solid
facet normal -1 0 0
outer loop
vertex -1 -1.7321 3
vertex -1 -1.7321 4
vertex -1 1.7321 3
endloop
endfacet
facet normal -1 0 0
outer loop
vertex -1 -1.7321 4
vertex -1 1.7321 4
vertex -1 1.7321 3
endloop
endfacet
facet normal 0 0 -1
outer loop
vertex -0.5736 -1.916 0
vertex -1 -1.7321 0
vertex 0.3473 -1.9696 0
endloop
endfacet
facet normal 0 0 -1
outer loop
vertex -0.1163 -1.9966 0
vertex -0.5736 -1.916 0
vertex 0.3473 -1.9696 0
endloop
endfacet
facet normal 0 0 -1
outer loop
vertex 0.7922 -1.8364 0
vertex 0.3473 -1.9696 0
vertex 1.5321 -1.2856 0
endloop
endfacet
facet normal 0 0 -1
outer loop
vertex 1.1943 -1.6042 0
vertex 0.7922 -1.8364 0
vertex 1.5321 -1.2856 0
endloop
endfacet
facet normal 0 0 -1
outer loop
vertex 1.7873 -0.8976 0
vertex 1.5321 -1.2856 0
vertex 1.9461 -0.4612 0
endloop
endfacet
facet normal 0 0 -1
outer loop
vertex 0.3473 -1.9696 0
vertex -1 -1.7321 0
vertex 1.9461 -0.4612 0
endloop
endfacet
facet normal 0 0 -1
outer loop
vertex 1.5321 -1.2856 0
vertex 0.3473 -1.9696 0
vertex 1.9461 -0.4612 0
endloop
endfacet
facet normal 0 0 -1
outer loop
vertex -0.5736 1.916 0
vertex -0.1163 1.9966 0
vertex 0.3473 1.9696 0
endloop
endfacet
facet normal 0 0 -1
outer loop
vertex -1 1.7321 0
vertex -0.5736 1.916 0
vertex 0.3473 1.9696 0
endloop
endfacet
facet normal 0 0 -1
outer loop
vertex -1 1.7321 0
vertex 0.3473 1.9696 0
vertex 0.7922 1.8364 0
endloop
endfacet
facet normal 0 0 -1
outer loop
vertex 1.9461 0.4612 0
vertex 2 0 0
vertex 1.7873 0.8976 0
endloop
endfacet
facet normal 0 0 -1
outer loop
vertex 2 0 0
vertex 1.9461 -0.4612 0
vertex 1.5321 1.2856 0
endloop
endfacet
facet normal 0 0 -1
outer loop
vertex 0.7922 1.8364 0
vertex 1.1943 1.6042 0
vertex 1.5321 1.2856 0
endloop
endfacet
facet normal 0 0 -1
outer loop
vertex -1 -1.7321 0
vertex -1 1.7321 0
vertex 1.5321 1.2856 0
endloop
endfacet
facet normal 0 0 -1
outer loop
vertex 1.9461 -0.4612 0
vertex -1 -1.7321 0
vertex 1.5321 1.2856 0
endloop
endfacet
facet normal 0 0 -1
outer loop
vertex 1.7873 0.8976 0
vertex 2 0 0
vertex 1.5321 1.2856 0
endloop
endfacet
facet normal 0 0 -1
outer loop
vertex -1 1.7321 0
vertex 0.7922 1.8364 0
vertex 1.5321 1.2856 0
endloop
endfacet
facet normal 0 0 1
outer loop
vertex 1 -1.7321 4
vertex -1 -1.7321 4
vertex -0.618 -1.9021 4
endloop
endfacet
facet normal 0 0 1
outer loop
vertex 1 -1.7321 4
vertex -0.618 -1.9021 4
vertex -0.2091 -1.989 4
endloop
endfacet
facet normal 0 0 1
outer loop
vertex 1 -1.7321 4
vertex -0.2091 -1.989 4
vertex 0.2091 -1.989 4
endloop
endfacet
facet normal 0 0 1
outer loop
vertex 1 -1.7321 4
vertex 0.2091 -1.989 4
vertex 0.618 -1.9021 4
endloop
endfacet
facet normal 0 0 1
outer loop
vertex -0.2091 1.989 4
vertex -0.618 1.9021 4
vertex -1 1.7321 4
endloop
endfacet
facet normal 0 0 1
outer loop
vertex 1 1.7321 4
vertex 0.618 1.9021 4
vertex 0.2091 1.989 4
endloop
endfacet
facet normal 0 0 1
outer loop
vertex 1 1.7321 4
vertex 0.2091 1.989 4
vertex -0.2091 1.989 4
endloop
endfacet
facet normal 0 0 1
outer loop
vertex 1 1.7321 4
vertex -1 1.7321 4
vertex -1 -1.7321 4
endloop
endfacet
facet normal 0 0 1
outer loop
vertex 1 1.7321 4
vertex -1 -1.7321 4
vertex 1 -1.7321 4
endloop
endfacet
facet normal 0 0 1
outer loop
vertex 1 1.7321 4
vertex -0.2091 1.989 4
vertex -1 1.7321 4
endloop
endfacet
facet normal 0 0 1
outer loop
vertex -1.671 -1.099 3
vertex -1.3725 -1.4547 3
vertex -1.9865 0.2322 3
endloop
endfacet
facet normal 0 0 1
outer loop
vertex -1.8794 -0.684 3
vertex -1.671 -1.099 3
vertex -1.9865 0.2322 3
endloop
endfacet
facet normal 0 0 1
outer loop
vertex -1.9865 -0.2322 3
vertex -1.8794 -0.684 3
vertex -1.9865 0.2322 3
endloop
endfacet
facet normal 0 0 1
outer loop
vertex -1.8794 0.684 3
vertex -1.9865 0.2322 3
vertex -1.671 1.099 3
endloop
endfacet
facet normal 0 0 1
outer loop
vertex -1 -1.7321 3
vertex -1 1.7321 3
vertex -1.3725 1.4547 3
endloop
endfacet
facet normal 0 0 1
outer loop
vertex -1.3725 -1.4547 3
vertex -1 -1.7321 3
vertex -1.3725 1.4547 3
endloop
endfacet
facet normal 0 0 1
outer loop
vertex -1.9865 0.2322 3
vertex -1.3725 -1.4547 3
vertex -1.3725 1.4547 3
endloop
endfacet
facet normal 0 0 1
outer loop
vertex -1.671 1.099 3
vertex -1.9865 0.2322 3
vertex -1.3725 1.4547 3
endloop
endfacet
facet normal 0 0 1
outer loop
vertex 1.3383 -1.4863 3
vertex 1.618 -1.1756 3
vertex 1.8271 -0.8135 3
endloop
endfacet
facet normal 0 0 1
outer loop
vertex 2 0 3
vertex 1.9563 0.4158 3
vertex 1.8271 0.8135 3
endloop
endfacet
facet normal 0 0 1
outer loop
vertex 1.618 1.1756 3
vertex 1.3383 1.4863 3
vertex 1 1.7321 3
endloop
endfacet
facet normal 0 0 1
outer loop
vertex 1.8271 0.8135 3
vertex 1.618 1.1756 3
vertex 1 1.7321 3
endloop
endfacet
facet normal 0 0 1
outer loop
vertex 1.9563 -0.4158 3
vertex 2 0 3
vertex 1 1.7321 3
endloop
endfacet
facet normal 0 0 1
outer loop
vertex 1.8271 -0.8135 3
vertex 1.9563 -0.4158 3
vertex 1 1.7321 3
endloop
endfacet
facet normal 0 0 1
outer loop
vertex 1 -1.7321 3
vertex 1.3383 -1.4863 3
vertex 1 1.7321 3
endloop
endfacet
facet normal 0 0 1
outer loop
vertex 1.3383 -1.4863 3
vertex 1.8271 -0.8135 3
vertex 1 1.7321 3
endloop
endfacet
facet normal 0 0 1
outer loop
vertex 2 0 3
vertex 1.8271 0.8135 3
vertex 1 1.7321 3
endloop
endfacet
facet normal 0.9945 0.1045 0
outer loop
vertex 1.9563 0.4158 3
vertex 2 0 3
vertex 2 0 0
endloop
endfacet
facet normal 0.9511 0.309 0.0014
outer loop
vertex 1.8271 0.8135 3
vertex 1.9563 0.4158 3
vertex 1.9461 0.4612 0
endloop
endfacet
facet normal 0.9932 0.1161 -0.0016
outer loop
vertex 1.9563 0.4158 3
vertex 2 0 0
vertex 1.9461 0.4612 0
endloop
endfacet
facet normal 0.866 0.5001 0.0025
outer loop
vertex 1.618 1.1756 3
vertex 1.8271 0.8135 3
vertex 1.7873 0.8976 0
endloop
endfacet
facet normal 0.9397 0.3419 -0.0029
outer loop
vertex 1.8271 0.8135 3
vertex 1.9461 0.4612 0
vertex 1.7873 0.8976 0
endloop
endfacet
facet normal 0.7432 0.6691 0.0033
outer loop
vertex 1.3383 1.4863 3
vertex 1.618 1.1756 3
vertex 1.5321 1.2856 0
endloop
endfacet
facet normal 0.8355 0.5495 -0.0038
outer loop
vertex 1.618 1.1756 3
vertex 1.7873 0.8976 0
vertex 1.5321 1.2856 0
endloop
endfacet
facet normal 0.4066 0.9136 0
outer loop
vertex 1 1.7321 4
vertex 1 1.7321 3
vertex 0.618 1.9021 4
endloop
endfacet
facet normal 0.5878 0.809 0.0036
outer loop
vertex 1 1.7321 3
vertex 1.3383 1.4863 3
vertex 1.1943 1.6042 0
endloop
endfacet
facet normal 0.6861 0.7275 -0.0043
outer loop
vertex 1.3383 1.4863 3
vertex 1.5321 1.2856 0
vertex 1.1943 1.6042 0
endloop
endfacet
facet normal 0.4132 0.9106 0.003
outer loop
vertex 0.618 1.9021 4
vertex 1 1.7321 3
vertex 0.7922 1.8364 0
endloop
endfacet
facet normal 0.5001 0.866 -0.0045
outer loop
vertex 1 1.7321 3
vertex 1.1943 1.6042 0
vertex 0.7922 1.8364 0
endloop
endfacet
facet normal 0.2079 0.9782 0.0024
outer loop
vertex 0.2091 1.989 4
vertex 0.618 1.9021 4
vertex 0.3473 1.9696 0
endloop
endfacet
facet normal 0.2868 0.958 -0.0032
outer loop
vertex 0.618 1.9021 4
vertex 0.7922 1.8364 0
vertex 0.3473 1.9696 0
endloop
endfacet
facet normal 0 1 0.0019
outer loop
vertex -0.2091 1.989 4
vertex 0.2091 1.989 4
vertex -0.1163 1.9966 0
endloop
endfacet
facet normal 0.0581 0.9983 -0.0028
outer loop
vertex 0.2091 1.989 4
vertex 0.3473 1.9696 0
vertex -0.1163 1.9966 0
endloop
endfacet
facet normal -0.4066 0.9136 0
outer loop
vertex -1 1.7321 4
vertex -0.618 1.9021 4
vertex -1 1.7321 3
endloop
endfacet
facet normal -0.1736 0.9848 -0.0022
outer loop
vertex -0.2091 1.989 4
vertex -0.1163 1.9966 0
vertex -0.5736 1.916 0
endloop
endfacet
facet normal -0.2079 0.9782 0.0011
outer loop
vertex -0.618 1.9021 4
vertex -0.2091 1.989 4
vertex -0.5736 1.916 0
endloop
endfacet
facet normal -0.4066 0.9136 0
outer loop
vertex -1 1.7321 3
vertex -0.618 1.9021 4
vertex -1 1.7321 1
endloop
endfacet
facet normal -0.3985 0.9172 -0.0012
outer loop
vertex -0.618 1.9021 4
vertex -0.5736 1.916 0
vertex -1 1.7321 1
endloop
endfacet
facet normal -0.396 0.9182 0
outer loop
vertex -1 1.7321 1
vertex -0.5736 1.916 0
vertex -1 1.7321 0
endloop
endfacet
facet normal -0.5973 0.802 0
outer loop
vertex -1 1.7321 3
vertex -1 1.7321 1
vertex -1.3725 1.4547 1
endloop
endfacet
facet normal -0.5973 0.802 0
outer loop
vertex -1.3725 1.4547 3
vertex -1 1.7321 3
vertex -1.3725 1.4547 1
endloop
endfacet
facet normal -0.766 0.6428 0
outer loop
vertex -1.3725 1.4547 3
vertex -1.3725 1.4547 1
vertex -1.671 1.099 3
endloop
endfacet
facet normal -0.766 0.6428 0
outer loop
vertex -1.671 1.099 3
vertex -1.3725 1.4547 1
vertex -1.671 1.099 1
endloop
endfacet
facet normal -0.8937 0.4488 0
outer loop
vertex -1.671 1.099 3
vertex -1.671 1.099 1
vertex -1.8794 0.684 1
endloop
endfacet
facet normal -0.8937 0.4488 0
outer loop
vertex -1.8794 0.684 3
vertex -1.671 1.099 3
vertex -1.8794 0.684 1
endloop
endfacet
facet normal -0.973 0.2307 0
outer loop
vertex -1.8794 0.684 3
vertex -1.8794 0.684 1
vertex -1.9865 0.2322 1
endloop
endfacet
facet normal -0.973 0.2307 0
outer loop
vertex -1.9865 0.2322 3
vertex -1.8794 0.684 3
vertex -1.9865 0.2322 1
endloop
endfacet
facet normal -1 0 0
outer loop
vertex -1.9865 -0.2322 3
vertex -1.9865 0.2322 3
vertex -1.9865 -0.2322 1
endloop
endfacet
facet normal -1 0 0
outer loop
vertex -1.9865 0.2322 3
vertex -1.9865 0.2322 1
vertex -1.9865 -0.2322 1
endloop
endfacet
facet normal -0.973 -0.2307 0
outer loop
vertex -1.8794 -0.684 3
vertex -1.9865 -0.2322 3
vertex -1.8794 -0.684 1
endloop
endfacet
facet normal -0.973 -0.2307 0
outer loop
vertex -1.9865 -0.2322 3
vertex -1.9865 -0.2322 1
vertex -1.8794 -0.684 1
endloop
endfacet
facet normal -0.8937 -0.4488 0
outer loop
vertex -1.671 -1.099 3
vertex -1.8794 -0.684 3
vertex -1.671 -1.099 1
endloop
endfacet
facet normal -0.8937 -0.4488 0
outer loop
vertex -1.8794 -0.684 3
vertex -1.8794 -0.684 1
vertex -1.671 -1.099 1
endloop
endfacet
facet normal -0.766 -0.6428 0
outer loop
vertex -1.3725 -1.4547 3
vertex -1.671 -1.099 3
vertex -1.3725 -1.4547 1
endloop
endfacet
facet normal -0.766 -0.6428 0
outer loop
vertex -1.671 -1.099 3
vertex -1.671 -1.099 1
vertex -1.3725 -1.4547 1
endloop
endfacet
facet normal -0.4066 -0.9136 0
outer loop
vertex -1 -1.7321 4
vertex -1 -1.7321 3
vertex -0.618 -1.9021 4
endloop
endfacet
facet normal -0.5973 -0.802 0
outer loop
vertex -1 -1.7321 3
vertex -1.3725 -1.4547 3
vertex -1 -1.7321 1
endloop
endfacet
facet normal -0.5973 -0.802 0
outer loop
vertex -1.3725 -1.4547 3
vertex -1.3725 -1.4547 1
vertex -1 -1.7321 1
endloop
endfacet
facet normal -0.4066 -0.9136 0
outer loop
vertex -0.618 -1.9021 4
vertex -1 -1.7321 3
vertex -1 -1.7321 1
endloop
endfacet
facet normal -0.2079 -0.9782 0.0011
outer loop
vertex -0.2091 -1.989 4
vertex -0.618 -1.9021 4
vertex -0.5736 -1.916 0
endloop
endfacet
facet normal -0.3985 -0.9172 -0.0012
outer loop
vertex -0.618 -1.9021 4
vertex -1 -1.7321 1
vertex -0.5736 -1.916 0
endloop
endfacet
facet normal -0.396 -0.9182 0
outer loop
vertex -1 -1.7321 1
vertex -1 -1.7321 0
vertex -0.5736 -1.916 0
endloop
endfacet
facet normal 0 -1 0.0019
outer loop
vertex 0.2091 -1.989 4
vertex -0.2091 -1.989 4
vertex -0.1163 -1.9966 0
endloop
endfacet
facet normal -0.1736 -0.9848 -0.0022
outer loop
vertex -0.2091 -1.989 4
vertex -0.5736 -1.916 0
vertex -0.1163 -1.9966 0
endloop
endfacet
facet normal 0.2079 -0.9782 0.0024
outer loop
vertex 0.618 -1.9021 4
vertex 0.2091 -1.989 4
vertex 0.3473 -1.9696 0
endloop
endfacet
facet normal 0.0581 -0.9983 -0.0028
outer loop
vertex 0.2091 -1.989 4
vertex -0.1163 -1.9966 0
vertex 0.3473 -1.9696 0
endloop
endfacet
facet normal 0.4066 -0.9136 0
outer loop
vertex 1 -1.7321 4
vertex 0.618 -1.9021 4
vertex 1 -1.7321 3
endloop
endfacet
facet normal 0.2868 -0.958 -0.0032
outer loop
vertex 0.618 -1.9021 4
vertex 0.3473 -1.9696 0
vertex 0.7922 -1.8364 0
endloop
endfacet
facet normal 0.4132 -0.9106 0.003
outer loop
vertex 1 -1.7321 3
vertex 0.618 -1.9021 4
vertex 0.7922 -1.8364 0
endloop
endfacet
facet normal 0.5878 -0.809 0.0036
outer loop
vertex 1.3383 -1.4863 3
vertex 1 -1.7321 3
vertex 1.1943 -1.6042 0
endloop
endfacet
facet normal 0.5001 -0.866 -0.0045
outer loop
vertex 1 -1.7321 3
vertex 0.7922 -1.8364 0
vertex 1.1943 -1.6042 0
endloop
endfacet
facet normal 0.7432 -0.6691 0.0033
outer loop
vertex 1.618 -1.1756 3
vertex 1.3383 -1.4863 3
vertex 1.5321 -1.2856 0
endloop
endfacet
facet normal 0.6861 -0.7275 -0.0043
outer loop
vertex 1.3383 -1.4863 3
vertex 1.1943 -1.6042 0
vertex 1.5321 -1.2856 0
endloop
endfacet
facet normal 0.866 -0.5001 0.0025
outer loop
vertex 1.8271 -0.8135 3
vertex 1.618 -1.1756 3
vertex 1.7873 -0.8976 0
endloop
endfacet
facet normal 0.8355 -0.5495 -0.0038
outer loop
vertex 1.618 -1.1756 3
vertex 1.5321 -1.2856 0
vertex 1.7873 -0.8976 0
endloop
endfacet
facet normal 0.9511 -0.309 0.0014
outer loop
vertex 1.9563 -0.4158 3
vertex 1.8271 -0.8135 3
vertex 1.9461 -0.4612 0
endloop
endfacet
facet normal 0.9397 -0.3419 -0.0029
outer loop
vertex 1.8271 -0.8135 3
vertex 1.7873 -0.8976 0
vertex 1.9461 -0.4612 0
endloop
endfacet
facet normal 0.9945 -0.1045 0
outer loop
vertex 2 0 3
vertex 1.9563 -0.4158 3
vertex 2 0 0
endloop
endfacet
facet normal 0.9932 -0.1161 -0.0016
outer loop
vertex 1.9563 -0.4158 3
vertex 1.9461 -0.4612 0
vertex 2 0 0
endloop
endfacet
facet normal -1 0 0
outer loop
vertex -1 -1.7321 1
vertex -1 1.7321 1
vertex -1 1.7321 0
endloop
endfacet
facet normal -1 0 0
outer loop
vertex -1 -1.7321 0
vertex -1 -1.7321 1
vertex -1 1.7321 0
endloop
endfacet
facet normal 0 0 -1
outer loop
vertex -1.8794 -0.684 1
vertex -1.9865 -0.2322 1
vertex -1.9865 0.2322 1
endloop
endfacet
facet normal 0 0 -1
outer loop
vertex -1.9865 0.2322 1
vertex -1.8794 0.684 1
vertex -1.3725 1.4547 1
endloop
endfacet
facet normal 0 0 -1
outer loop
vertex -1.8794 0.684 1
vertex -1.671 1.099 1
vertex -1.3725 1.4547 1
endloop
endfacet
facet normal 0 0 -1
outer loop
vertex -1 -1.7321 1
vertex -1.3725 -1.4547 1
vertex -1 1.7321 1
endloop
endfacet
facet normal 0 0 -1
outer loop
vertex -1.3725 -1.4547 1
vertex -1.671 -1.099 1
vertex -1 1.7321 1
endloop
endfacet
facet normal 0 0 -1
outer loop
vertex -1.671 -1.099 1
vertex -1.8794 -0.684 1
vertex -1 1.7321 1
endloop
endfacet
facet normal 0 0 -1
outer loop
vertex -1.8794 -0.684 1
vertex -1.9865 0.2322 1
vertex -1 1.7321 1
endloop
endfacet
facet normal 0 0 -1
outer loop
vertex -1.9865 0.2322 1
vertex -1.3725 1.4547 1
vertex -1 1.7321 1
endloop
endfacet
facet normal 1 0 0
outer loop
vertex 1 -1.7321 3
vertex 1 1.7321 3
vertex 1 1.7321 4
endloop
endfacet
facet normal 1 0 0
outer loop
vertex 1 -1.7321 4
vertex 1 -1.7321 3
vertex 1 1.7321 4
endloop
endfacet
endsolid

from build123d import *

# Parameters (mm, degrees)
SKETCH1_R           = 2
BOSS_EXTRUDE1_DEPTH = 4
CUT_EXTRUDE1_DEPTH  = 5


with BuildPart() as part:
    # Sketch1 → Boss-Extrude1 (new body)
    with BuildSketch(Plane.XY):
        Circle(SKETCH1_R)
    extrude(amount=BOSS_EXTRUDE1_DEPTH)

    # Sketch2 → Cut-Extrude1 (cut, symmetric)
    with BuildSketch(Plane(origin=(0, 0, 0), x_dir=(1, 0, 0), z_dir=(0, 1, 0))):
        Polygon((2, -3), (1, -3), (1, -4.221507546), (-1, -4.26455627), (-1, -3), (-2.31386892, -3), (-2.31386892, -1), (-1, -1), (-1, 0.234035397), (-2.586760402, 0.199881392), (-2.489753088, -4.306979917), (2, -4.619024092), (2.554571986, -4.221507546), align=None)
    extrude(amount=CUT_EXTRUDE1_DEPTH, both=True, mode=Mode.SUBTRACT)


solid = part.part
